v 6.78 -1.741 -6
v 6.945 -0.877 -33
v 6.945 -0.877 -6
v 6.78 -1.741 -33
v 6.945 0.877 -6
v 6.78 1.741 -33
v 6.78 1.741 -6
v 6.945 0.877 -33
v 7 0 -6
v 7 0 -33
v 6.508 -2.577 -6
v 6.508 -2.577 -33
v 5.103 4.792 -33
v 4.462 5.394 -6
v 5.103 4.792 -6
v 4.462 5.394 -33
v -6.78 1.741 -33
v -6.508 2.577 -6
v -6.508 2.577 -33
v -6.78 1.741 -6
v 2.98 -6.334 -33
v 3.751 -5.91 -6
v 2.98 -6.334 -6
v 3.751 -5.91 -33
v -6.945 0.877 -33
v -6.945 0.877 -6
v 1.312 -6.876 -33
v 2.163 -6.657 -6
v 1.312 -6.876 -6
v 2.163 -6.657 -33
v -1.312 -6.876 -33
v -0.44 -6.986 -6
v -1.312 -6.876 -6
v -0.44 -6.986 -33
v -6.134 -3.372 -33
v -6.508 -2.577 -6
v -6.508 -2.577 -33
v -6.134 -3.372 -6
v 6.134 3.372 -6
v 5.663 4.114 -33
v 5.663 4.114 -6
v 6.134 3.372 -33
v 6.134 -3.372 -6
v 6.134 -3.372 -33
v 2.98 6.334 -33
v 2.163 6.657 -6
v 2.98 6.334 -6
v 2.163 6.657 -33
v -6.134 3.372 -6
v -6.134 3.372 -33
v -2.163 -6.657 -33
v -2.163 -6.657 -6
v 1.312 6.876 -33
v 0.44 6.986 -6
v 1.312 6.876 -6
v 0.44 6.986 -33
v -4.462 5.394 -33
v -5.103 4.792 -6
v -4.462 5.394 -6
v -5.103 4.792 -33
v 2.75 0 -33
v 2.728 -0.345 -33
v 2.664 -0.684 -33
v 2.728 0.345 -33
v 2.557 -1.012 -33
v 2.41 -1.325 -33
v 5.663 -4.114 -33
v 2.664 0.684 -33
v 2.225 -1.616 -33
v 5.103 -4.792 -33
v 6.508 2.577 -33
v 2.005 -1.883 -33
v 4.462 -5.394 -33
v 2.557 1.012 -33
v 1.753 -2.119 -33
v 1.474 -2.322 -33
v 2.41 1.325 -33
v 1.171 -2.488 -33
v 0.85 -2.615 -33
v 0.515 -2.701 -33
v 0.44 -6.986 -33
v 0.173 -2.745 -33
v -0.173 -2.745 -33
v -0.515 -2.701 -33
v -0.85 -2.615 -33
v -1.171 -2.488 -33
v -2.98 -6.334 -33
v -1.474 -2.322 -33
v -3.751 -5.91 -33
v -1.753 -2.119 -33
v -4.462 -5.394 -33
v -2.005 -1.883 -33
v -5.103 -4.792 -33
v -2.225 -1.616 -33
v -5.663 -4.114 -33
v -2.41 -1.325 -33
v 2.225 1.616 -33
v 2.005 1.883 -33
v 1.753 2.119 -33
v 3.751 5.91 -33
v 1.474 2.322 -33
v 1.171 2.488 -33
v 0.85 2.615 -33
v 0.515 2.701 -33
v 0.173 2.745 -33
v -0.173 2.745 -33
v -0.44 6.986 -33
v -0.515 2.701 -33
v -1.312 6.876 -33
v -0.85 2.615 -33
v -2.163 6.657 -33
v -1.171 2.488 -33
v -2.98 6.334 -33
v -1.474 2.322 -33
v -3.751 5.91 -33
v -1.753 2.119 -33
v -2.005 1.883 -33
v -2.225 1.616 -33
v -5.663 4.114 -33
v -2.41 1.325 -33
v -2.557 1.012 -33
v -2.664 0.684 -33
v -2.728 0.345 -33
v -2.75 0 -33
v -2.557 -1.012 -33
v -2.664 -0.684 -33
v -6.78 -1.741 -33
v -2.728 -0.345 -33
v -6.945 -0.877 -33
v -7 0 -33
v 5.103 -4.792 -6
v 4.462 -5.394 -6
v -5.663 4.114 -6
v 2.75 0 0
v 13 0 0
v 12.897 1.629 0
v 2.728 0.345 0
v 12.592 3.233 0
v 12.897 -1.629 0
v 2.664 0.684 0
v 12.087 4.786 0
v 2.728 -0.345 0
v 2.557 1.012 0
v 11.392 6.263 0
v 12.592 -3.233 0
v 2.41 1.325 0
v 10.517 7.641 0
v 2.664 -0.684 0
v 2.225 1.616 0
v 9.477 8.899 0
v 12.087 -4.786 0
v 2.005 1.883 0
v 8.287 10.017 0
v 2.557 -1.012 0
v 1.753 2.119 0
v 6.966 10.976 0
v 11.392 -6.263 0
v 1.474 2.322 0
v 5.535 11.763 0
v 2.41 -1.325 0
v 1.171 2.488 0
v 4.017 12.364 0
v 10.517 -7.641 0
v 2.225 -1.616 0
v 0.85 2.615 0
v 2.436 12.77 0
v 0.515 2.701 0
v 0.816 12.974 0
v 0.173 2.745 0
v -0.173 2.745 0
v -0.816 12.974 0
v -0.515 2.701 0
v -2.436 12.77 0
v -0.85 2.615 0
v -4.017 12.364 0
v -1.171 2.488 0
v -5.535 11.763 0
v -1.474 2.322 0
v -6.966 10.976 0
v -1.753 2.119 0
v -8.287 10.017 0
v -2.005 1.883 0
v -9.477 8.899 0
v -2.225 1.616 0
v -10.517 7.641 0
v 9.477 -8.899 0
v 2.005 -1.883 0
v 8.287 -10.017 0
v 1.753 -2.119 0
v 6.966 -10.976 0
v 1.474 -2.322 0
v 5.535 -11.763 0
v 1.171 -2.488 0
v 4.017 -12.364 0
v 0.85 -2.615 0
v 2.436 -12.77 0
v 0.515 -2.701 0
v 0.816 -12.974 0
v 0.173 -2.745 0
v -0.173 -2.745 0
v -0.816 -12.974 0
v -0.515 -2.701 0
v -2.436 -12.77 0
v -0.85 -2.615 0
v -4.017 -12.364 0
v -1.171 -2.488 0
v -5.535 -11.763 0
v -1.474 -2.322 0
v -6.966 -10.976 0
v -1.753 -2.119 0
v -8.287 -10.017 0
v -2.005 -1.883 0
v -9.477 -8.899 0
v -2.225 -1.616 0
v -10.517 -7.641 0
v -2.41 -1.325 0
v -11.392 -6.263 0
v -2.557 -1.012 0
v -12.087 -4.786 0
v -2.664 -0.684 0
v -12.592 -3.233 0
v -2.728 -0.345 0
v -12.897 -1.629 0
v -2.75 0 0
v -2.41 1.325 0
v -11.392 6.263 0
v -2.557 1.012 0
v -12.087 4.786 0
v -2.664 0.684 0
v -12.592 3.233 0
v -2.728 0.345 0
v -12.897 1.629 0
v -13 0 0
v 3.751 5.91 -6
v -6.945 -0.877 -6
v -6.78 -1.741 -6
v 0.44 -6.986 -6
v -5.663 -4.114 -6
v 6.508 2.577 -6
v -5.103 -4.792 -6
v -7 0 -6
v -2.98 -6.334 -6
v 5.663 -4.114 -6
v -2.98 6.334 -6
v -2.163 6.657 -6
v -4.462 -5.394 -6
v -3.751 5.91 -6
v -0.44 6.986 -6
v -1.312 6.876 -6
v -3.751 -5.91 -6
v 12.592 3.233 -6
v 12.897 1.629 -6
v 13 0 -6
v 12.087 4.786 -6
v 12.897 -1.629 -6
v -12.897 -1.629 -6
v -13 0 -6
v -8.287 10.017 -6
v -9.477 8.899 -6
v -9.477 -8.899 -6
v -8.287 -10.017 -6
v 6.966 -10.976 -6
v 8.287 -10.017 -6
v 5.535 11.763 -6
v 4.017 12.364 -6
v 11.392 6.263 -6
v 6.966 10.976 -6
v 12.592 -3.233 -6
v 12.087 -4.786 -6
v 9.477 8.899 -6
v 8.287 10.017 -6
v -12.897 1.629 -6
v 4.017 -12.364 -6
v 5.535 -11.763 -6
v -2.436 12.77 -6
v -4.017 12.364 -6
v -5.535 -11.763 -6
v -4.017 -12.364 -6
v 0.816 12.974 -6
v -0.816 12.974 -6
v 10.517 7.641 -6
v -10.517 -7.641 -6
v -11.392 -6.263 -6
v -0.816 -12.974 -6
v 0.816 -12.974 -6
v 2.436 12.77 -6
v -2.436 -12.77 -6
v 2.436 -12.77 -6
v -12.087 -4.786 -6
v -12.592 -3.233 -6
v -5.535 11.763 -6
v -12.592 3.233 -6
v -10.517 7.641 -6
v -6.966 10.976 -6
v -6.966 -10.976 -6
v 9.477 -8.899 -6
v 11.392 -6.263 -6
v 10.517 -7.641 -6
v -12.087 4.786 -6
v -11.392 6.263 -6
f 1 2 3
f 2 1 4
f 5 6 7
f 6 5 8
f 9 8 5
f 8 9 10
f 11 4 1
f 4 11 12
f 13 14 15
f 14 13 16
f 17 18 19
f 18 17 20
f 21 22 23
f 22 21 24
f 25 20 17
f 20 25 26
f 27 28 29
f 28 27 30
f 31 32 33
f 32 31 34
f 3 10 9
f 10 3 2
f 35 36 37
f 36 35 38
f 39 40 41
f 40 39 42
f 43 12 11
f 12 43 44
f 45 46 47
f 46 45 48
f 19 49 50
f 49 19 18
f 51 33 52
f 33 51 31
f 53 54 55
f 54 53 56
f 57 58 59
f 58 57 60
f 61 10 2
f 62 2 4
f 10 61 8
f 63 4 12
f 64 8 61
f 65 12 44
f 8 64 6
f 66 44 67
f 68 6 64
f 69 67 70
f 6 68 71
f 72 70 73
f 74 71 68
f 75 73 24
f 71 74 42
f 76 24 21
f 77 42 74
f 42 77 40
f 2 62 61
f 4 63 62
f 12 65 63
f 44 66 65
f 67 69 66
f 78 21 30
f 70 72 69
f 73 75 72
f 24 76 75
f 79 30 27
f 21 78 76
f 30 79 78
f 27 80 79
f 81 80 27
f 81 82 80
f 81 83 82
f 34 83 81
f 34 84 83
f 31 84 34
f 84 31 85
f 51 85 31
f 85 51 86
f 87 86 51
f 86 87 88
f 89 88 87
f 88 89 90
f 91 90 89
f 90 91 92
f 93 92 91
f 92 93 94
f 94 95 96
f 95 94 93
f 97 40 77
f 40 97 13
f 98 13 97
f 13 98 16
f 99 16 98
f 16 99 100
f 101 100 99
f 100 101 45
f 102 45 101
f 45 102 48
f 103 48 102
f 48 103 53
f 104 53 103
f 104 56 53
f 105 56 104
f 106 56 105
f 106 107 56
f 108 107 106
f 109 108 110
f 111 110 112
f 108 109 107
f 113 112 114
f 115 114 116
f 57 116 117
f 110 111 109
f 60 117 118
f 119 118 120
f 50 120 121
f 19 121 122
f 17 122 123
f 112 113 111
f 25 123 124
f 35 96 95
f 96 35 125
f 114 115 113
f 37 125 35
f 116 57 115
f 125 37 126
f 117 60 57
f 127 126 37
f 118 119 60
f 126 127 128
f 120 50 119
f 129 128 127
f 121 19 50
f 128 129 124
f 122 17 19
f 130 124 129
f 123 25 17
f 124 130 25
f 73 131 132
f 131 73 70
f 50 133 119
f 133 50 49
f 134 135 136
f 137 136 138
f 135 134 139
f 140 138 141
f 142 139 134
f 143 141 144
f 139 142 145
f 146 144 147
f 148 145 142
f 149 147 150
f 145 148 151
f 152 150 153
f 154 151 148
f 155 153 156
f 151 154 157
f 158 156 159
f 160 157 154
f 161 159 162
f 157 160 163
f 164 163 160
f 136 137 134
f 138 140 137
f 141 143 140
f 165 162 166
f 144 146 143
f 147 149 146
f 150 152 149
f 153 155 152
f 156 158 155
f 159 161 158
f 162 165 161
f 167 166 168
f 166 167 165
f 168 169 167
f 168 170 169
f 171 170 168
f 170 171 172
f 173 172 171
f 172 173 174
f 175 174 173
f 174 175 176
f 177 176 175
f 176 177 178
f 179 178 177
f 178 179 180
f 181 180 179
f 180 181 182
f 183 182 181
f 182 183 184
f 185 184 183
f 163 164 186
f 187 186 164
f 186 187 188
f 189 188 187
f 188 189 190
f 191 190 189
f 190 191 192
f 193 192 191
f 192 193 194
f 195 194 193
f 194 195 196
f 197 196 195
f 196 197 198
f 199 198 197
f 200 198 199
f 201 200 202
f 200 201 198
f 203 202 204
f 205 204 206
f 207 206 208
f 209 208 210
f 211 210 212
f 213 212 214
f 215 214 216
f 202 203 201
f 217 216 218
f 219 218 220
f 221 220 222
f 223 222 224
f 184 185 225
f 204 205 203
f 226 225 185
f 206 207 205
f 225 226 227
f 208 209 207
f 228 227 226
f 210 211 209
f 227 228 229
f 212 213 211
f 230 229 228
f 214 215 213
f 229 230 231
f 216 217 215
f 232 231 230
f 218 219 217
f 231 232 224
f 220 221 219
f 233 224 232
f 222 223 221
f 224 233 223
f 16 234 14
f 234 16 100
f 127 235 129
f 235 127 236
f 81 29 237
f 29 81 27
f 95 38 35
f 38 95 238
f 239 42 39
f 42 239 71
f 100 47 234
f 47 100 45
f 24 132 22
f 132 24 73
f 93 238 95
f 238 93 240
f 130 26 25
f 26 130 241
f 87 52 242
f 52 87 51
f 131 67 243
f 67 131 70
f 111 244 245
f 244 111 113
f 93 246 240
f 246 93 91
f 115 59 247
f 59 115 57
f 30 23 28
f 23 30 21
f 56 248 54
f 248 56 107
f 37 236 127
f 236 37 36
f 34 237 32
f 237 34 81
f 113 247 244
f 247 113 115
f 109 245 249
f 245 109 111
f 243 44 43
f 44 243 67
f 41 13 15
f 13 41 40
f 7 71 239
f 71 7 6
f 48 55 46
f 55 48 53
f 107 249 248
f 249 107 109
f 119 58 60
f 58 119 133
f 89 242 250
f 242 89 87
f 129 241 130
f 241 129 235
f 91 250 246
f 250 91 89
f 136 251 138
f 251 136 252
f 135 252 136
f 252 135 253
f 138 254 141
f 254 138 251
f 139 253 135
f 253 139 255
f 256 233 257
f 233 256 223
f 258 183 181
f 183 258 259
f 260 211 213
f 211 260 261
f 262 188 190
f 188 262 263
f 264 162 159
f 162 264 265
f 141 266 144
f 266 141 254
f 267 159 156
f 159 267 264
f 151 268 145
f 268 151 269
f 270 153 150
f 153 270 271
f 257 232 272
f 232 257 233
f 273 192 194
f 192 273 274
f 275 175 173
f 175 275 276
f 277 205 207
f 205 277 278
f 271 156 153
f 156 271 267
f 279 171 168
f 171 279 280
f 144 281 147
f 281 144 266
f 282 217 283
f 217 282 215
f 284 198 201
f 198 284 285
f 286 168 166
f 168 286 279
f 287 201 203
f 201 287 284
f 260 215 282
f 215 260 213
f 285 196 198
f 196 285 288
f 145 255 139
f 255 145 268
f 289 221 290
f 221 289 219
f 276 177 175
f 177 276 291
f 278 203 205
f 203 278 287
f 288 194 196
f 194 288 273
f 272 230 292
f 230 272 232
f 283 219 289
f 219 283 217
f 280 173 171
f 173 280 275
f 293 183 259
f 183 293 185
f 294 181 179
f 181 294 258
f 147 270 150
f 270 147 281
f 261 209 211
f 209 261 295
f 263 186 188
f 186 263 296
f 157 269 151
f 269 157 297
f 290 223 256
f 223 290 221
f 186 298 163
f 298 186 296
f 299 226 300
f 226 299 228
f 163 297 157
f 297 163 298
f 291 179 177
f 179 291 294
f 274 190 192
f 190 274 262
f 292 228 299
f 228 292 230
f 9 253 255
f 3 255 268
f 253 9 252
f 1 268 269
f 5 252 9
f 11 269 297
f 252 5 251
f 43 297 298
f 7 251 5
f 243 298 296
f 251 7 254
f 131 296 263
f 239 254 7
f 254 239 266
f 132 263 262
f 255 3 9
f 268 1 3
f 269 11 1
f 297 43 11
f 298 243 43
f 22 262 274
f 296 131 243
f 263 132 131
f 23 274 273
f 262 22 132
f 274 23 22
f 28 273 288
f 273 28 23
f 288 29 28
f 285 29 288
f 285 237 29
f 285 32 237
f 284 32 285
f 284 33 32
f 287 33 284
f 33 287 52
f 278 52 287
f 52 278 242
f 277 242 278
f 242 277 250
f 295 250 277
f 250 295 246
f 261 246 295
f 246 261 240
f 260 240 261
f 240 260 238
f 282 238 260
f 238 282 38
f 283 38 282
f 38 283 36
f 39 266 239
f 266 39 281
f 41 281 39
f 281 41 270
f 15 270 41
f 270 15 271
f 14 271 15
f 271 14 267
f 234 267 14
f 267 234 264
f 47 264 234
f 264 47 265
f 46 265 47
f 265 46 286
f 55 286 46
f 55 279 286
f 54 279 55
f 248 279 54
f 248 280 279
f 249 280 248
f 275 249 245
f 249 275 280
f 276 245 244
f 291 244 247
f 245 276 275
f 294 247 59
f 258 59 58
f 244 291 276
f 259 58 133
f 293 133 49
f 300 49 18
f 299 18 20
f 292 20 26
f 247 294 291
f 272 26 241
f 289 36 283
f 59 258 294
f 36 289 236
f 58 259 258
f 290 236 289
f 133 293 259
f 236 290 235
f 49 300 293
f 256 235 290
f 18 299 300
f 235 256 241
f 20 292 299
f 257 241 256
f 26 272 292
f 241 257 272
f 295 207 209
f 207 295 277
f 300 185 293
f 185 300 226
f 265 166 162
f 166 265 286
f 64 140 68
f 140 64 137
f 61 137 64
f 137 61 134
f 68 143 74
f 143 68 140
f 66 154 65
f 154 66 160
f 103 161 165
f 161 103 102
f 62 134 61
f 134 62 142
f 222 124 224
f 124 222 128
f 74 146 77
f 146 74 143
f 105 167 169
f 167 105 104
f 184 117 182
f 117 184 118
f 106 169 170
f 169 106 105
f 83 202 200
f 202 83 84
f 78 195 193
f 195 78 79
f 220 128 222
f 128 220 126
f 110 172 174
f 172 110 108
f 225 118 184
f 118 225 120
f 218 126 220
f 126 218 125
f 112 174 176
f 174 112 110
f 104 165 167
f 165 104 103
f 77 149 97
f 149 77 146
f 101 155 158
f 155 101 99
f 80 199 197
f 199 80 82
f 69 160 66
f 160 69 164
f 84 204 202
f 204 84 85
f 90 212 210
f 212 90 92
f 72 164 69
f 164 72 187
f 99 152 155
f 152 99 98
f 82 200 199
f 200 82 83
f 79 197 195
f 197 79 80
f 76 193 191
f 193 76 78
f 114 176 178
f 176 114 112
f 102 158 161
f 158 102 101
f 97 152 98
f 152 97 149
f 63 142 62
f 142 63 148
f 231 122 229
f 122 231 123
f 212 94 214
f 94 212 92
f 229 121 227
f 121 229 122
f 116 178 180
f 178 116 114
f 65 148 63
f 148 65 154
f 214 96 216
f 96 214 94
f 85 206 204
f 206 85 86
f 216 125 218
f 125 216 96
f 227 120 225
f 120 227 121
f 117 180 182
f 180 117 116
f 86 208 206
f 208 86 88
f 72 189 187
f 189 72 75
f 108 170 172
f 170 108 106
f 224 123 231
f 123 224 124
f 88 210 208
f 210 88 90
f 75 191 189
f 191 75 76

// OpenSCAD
$fn = 50;


difference() {
	union() {
		translate(v = [0, 0, -33.0000000000]) {
			cylinder(h = 33, r = 7.0000000000);
		}
		translate(v = [0, 0, -6.0000000000]) {
			cylinder(h = 6, r = 13.0000000000);
		}
	}
	union() {
		#translate(v = [0, 0, -33]) {
			cylinder(h = 33, r = 2.7500000000);
		}
	}
}
